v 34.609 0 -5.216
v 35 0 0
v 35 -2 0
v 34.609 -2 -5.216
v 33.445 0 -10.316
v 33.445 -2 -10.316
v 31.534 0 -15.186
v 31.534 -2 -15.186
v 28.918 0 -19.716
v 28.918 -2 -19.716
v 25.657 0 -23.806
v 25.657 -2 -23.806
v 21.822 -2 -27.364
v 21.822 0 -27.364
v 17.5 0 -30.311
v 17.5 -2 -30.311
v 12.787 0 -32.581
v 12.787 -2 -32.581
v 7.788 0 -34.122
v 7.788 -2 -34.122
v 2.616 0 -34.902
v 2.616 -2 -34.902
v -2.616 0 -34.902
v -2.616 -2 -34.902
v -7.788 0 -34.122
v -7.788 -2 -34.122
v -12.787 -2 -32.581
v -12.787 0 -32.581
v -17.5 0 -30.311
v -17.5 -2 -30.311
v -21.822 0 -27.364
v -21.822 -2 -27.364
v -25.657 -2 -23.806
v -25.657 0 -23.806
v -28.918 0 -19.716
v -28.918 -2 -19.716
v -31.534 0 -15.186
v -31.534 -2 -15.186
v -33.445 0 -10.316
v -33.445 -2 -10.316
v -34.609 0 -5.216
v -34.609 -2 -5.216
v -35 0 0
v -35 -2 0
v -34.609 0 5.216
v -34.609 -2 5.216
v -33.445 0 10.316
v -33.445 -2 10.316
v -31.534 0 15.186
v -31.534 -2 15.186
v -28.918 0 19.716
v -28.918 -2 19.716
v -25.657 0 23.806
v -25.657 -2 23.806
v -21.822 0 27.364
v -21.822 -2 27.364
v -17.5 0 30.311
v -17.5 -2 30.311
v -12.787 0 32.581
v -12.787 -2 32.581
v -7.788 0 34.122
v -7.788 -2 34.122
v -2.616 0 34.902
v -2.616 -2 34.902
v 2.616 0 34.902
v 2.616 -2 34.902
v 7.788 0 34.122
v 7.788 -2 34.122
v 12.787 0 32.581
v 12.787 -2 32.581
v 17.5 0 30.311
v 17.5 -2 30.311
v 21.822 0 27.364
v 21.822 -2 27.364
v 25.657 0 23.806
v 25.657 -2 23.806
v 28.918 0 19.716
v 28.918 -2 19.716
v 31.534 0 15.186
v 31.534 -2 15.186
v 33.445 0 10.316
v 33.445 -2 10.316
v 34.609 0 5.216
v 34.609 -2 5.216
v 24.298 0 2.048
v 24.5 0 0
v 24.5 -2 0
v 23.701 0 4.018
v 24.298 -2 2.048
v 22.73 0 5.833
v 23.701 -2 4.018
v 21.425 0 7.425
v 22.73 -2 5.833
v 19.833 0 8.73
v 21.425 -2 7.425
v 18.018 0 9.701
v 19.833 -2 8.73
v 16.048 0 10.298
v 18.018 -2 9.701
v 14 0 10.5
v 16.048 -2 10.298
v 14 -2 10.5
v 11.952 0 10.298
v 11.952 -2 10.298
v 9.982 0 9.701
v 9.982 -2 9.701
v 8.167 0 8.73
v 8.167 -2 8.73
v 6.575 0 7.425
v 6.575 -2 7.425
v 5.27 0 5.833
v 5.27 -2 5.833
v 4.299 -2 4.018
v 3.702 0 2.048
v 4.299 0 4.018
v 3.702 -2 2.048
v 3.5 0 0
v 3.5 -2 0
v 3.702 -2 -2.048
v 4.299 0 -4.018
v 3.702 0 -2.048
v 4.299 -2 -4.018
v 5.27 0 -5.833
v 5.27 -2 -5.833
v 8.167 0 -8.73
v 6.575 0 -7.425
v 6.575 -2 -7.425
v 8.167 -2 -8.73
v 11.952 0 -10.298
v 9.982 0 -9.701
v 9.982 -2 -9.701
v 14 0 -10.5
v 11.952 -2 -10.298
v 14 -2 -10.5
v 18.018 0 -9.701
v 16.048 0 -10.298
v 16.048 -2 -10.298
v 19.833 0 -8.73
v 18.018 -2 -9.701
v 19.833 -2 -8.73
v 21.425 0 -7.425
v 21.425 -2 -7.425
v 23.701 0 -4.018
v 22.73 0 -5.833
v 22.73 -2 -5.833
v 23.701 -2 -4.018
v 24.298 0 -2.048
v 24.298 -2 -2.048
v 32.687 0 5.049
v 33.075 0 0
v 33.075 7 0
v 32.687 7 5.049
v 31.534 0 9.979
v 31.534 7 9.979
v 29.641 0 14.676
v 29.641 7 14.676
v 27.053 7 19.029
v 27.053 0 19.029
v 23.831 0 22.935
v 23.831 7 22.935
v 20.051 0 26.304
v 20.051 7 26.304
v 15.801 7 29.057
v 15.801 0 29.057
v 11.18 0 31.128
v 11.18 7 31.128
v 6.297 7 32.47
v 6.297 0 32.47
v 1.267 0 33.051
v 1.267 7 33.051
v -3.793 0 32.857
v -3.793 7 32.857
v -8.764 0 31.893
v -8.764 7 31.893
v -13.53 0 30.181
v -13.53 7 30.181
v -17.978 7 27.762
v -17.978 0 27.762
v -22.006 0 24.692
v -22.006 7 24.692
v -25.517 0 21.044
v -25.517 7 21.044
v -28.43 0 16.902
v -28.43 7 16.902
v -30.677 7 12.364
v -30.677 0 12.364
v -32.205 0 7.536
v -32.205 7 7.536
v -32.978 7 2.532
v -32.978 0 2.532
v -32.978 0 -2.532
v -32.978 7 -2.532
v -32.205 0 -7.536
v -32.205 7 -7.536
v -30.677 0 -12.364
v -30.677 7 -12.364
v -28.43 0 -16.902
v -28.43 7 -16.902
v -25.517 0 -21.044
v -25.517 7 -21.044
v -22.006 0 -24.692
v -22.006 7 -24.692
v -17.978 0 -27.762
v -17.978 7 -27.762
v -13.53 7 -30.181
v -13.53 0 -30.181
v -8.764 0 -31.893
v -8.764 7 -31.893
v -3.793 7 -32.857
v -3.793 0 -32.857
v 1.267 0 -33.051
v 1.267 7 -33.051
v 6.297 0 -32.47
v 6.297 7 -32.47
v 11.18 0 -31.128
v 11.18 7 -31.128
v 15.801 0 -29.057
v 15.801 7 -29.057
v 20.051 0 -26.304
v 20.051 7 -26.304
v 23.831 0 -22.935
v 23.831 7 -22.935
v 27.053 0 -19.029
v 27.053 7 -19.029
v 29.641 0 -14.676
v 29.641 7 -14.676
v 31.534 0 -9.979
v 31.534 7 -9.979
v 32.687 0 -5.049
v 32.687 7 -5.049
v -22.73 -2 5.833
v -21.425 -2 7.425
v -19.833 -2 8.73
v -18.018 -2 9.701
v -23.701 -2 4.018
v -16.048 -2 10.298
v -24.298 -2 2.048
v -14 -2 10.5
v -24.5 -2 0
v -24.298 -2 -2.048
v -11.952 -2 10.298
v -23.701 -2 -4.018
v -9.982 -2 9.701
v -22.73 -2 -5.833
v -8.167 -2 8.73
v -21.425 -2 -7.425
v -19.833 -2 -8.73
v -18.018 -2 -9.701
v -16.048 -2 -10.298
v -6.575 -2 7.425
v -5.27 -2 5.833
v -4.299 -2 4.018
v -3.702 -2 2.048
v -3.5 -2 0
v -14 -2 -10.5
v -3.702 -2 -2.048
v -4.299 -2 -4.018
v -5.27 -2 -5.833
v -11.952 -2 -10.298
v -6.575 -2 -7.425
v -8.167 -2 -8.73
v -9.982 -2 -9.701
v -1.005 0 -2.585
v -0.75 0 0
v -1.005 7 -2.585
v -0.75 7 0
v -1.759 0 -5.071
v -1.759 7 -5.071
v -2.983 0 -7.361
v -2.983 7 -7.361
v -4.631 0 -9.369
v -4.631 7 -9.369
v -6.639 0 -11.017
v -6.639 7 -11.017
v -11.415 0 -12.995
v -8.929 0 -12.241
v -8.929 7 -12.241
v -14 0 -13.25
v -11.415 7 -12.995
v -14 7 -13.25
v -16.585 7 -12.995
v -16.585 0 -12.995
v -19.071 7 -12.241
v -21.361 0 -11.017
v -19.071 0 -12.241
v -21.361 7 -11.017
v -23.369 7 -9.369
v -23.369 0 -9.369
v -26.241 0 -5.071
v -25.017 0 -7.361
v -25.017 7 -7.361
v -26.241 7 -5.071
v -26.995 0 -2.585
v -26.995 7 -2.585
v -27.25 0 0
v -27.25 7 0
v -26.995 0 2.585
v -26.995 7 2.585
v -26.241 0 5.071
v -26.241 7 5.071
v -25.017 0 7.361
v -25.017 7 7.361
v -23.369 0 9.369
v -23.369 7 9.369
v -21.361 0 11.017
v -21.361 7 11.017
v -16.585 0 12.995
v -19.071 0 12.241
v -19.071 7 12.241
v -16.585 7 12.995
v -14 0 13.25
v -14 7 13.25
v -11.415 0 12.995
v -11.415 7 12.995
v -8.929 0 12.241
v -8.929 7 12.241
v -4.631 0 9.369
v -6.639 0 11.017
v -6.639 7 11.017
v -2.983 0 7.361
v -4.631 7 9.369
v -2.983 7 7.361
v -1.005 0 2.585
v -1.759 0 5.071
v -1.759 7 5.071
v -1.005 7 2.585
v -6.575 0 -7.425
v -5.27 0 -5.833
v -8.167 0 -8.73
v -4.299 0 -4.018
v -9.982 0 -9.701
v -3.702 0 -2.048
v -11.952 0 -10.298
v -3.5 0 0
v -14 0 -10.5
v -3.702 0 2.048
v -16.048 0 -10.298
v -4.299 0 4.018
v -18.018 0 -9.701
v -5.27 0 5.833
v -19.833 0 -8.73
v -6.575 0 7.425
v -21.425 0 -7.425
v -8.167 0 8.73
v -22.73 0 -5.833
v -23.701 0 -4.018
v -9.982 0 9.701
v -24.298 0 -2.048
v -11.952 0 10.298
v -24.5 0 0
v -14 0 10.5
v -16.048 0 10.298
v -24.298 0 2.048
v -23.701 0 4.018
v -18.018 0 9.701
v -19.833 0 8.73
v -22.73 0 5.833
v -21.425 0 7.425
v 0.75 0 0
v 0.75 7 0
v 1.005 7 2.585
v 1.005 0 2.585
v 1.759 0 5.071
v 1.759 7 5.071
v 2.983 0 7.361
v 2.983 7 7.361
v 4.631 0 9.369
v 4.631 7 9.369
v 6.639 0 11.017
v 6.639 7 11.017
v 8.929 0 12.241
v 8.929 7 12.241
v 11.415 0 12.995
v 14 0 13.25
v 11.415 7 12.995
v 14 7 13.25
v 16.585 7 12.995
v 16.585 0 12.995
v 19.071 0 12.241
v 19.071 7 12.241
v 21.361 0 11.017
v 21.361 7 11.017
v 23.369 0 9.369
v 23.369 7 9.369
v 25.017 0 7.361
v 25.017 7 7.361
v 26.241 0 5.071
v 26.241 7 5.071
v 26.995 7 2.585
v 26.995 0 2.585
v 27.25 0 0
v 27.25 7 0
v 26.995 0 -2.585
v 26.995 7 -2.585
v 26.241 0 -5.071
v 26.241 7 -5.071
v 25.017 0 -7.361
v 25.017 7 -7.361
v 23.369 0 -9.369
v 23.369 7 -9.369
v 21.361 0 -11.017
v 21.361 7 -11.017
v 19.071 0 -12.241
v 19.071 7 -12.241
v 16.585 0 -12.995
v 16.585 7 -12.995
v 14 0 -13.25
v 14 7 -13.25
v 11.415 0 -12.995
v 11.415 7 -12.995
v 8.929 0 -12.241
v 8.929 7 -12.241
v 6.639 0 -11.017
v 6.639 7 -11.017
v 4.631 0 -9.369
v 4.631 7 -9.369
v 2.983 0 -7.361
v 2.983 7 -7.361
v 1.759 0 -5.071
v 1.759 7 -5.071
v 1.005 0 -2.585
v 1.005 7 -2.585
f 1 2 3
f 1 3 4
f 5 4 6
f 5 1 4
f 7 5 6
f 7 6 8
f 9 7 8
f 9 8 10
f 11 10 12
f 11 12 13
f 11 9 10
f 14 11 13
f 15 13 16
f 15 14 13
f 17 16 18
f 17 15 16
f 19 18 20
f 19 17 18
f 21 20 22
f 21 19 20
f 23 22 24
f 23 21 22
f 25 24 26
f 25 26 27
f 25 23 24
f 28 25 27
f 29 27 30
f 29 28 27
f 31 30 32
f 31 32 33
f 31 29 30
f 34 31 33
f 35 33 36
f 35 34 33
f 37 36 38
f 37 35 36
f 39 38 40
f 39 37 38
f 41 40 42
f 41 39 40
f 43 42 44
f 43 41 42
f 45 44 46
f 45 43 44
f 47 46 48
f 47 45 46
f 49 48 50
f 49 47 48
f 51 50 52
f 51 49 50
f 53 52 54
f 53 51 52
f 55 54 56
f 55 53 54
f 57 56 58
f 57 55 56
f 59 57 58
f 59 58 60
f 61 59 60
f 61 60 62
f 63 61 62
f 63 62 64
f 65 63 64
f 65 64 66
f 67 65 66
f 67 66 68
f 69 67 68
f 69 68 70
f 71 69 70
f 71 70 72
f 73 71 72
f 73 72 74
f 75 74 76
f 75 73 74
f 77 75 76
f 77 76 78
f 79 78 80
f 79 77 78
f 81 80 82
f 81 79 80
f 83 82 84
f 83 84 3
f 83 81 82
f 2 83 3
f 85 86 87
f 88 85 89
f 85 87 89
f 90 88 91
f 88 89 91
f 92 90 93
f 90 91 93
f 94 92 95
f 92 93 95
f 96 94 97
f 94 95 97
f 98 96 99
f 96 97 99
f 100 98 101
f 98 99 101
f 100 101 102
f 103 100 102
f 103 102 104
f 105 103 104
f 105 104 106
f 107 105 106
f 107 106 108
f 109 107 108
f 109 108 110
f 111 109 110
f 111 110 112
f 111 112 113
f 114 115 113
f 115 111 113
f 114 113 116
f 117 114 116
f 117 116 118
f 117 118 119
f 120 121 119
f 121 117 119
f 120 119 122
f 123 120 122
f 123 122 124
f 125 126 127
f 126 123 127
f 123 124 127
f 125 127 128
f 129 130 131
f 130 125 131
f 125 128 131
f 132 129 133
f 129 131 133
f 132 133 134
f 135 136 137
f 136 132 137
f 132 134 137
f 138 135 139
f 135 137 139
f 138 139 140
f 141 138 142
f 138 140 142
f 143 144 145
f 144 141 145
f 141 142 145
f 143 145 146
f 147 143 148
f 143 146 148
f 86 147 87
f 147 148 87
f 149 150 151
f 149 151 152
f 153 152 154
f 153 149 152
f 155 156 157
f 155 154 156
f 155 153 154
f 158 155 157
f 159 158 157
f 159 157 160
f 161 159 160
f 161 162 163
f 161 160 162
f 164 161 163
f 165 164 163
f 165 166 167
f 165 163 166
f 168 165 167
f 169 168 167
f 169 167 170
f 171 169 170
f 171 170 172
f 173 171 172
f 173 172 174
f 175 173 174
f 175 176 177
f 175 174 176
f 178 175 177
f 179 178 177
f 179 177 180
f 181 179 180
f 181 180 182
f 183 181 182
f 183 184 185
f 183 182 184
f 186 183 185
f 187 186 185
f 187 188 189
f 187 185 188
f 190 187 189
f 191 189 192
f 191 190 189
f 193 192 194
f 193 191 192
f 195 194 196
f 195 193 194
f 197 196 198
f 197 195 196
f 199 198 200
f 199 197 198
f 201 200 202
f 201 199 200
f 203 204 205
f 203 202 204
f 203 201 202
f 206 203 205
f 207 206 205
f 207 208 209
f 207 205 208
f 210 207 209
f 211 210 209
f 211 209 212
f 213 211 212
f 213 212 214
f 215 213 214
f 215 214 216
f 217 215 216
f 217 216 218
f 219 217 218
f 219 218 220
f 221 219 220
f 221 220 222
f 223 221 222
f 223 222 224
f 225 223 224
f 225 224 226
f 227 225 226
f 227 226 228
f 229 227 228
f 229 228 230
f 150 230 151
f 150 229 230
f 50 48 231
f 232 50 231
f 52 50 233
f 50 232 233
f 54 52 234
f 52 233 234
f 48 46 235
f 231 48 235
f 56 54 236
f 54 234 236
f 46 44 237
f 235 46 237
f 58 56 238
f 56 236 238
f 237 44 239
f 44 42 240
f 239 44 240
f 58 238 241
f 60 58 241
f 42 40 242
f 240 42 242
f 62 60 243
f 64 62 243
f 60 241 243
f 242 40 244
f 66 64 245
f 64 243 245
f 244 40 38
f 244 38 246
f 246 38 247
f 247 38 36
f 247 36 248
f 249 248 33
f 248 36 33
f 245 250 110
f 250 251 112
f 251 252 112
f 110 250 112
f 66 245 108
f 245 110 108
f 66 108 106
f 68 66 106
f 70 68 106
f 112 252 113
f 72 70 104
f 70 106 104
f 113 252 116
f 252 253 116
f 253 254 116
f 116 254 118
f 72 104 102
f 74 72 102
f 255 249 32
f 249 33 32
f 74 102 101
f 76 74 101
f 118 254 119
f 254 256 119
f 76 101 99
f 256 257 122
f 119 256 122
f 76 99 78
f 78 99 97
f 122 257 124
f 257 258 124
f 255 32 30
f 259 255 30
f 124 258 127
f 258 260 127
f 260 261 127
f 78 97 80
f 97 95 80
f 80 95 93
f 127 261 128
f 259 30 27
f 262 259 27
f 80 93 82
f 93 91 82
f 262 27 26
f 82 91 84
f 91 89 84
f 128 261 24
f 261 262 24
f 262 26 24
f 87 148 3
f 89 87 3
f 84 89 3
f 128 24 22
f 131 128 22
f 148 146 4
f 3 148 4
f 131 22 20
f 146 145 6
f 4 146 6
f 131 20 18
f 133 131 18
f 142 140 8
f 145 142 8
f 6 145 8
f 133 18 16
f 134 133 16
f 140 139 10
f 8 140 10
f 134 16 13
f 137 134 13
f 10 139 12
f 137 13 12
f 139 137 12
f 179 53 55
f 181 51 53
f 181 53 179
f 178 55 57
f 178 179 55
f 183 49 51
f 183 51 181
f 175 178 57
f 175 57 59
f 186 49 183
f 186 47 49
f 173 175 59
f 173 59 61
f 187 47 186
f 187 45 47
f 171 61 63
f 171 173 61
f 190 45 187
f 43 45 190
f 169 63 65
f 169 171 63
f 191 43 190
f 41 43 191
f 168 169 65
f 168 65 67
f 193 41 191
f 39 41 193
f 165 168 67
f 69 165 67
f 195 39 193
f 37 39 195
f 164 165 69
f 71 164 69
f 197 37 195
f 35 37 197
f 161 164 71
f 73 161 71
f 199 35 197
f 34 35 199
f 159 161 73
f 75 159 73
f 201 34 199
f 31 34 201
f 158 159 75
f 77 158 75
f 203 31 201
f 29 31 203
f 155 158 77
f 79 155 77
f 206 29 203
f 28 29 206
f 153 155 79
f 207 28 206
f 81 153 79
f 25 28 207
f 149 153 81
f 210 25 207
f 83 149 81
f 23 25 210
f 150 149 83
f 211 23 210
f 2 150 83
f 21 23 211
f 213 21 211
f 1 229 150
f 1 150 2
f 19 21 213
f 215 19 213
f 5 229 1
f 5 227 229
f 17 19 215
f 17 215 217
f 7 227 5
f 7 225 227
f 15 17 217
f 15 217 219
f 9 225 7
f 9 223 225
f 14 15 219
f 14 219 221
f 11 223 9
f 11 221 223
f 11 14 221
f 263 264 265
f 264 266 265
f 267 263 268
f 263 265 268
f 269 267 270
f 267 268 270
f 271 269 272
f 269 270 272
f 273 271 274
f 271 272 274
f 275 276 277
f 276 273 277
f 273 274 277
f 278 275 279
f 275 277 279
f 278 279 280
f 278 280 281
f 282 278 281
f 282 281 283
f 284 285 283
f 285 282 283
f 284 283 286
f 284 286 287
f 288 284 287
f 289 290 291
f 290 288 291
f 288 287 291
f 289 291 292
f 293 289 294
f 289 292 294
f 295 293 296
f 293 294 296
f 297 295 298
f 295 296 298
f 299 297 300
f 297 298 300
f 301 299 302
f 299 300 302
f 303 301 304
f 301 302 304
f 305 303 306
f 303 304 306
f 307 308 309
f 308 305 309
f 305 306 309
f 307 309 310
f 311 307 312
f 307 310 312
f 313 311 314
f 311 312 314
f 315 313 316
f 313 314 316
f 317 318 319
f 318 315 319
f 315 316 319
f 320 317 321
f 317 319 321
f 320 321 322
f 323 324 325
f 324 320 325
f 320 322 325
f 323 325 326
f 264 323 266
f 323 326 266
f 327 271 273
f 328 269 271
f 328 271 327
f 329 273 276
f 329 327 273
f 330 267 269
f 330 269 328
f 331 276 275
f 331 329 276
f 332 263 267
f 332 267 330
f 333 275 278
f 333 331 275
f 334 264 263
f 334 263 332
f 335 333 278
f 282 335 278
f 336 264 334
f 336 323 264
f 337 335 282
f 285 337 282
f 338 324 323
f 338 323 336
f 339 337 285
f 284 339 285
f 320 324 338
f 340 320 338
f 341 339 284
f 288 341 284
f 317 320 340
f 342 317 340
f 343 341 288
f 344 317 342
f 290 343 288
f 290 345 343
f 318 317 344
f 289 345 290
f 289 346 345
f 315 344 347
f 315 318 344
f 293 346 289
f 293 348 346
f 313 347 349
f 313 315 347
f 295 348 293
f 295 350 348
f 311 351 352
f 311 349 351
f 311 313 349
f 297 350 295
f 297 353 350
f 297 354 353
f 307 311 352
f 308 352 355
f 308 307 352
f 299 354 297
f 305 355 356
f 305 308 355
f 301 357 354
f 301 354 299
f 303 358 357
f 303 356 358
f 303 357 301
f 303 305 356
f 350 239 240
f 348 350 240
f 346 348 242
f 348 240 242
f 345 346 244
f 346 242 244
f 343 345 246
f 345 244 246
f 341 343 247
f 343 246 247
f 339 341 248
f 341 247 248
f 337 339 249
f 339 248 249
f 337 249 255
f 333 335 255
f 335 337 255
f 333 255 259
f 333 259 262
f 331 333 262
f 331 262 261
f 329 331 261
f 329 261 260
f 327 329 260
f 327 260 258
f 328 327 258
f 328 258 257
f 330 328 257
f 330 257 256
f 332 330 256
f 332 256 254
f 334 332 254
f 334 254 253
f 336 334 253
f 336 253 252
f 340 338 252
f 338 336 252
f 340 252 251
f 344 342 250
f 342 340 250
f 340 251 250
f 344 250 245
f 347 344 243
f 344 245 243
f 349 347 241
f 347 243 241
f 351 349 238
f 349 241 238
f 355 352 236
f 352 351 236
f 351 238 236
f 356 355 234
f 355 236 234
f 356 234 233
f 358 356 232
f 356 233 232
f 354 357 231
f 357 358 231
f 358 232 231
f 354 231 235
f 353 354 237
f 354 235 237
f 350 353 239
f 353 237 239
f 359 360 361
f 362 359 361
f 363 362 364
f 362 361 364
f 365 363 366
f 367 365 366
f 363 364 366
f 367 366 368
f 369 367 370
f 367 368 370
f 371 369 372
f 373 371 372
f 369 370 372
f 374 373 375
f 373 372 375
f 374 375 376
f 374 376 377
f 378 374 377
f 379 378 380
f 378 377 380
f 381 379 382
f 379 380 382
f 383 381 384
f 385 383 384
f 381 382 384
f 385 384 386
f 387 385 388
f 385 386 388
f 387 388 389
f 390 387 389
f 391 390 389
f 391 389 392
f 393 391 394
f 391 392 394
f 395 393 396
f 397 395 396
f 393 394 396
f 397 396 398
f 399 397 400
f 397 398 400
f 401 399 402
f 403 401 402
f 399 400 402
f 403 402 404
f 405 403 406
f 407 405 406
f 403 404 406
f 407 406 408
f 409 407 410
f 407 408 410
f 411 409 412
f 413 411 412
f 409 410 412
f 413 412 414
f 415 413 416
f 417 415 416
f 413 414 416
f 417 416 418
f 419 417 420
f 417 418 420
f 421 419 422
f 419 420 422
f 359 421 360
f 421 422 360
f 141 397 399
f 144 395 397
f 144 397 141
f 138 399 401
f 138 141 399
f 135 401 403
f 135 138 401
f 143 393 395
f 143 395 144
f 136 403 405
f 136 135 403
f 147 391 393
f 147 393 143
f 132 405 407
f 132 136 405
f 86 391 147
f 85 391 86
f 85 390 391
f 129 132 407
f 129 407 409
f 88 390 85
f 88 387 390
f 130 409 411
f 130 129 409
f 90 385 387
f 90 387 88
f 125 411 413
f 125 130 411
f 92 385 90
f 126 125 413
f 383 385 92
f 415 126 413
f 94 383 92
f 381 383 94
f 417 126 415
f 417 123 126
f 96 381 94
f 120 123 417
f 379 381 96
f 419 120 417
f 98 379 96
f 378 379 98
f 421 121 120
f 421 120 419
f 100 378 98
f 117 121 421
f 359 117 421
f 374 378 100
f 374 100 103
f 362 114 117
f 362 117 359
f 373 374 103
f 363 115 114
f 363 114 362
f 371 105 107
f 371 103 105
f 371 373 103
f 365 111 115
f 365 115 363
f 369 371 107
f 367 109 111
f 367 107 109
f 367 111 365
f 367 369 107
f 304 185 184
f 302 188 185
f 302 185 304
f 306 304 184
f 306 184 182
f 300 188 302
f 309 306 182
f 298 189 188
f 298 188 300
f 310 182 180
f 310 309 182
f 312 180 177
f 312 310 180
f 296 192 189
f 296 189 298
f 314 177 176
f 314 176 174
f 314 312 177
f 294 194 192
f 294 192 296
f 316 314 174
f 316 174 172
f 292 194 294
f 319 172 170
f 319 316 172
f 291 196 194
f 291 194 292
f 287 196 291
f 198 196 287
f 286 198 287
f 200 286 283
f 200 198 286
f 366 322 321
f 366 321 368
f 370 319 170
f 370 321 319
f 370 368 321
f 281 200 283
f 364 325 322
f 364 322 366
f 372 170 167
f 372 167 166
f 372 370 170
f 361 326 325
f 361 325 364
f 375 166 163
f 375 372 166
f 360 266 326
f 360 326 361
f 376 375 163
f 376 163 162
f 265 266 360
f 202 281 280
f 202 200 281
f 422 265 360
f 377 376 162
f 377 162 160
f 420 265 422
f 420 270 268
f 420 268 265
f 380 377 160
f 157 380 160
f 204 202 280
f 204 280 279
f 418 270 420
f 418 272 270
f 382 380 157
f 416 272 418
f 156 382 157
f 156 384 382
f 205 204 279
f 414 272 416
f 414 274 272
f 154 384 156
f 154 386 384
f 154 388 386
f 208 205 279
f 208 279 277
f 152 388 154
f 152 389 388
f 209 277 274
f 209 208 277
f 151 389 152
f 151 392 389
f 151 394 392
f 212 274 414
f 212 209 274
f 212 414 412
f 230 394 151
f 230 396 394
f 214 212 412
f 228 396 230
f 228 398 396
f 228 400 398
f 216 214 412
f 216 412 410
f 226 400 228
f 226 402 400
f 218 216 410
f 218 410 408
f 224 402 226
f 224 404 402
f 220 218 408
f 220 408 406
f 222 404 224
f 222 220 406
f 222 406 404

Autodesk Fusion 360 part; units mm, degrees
sketch "Sketch1" plane through (0, 0, 0) normal (0, 1, 0) x (1, 0, 0)
  circle A0 centre (0, 0) radius 33.075
  circle A1 centre (0, 0) radius 35
  dimension "d1" = 66.15
  dimension "d2" = 70
extrude "Extrude1" add sketch "Sketch1" along normal blind 7 contours A0
extrude "Extrude2" add sketch "Sketch1" against normal blind 2 contours A0 | A1
sketch "Sketch4" plane through (0, -2, 0) normal (0, -1, 0) x (1, 0, 0)
  circle A0 centre (0, 0) radius 35
  circle A1 centre (14, 0) radius 10.5
  circle A2 centre (0, 0) radius 33.075
  dimension "d33" = 21
  dimension "d39" = 14
extrude "Extrude8" cut sketch "Sketch4" against normal up to surface (9 mm away) contours A1
sketch "Sketch5" plane through (0, 7, 0) normal (0, 1, 0) x (-1, 0, 0)
  circle A0 centre (-14, 0) radius 10.5
  circle A1 centre (0, 0) radius 33.075
  circle A2 centre (-14, 0) radius 13.25
  dimension "d36" = 26.5
extrude "Extrude9" cut sketch "Sketch5" against normal blind 7 contours A2
mirror "Mirror3" about plane through (0, 0, 0) normal (1, 0, 0) of "Extrude9", "Extrude8"
